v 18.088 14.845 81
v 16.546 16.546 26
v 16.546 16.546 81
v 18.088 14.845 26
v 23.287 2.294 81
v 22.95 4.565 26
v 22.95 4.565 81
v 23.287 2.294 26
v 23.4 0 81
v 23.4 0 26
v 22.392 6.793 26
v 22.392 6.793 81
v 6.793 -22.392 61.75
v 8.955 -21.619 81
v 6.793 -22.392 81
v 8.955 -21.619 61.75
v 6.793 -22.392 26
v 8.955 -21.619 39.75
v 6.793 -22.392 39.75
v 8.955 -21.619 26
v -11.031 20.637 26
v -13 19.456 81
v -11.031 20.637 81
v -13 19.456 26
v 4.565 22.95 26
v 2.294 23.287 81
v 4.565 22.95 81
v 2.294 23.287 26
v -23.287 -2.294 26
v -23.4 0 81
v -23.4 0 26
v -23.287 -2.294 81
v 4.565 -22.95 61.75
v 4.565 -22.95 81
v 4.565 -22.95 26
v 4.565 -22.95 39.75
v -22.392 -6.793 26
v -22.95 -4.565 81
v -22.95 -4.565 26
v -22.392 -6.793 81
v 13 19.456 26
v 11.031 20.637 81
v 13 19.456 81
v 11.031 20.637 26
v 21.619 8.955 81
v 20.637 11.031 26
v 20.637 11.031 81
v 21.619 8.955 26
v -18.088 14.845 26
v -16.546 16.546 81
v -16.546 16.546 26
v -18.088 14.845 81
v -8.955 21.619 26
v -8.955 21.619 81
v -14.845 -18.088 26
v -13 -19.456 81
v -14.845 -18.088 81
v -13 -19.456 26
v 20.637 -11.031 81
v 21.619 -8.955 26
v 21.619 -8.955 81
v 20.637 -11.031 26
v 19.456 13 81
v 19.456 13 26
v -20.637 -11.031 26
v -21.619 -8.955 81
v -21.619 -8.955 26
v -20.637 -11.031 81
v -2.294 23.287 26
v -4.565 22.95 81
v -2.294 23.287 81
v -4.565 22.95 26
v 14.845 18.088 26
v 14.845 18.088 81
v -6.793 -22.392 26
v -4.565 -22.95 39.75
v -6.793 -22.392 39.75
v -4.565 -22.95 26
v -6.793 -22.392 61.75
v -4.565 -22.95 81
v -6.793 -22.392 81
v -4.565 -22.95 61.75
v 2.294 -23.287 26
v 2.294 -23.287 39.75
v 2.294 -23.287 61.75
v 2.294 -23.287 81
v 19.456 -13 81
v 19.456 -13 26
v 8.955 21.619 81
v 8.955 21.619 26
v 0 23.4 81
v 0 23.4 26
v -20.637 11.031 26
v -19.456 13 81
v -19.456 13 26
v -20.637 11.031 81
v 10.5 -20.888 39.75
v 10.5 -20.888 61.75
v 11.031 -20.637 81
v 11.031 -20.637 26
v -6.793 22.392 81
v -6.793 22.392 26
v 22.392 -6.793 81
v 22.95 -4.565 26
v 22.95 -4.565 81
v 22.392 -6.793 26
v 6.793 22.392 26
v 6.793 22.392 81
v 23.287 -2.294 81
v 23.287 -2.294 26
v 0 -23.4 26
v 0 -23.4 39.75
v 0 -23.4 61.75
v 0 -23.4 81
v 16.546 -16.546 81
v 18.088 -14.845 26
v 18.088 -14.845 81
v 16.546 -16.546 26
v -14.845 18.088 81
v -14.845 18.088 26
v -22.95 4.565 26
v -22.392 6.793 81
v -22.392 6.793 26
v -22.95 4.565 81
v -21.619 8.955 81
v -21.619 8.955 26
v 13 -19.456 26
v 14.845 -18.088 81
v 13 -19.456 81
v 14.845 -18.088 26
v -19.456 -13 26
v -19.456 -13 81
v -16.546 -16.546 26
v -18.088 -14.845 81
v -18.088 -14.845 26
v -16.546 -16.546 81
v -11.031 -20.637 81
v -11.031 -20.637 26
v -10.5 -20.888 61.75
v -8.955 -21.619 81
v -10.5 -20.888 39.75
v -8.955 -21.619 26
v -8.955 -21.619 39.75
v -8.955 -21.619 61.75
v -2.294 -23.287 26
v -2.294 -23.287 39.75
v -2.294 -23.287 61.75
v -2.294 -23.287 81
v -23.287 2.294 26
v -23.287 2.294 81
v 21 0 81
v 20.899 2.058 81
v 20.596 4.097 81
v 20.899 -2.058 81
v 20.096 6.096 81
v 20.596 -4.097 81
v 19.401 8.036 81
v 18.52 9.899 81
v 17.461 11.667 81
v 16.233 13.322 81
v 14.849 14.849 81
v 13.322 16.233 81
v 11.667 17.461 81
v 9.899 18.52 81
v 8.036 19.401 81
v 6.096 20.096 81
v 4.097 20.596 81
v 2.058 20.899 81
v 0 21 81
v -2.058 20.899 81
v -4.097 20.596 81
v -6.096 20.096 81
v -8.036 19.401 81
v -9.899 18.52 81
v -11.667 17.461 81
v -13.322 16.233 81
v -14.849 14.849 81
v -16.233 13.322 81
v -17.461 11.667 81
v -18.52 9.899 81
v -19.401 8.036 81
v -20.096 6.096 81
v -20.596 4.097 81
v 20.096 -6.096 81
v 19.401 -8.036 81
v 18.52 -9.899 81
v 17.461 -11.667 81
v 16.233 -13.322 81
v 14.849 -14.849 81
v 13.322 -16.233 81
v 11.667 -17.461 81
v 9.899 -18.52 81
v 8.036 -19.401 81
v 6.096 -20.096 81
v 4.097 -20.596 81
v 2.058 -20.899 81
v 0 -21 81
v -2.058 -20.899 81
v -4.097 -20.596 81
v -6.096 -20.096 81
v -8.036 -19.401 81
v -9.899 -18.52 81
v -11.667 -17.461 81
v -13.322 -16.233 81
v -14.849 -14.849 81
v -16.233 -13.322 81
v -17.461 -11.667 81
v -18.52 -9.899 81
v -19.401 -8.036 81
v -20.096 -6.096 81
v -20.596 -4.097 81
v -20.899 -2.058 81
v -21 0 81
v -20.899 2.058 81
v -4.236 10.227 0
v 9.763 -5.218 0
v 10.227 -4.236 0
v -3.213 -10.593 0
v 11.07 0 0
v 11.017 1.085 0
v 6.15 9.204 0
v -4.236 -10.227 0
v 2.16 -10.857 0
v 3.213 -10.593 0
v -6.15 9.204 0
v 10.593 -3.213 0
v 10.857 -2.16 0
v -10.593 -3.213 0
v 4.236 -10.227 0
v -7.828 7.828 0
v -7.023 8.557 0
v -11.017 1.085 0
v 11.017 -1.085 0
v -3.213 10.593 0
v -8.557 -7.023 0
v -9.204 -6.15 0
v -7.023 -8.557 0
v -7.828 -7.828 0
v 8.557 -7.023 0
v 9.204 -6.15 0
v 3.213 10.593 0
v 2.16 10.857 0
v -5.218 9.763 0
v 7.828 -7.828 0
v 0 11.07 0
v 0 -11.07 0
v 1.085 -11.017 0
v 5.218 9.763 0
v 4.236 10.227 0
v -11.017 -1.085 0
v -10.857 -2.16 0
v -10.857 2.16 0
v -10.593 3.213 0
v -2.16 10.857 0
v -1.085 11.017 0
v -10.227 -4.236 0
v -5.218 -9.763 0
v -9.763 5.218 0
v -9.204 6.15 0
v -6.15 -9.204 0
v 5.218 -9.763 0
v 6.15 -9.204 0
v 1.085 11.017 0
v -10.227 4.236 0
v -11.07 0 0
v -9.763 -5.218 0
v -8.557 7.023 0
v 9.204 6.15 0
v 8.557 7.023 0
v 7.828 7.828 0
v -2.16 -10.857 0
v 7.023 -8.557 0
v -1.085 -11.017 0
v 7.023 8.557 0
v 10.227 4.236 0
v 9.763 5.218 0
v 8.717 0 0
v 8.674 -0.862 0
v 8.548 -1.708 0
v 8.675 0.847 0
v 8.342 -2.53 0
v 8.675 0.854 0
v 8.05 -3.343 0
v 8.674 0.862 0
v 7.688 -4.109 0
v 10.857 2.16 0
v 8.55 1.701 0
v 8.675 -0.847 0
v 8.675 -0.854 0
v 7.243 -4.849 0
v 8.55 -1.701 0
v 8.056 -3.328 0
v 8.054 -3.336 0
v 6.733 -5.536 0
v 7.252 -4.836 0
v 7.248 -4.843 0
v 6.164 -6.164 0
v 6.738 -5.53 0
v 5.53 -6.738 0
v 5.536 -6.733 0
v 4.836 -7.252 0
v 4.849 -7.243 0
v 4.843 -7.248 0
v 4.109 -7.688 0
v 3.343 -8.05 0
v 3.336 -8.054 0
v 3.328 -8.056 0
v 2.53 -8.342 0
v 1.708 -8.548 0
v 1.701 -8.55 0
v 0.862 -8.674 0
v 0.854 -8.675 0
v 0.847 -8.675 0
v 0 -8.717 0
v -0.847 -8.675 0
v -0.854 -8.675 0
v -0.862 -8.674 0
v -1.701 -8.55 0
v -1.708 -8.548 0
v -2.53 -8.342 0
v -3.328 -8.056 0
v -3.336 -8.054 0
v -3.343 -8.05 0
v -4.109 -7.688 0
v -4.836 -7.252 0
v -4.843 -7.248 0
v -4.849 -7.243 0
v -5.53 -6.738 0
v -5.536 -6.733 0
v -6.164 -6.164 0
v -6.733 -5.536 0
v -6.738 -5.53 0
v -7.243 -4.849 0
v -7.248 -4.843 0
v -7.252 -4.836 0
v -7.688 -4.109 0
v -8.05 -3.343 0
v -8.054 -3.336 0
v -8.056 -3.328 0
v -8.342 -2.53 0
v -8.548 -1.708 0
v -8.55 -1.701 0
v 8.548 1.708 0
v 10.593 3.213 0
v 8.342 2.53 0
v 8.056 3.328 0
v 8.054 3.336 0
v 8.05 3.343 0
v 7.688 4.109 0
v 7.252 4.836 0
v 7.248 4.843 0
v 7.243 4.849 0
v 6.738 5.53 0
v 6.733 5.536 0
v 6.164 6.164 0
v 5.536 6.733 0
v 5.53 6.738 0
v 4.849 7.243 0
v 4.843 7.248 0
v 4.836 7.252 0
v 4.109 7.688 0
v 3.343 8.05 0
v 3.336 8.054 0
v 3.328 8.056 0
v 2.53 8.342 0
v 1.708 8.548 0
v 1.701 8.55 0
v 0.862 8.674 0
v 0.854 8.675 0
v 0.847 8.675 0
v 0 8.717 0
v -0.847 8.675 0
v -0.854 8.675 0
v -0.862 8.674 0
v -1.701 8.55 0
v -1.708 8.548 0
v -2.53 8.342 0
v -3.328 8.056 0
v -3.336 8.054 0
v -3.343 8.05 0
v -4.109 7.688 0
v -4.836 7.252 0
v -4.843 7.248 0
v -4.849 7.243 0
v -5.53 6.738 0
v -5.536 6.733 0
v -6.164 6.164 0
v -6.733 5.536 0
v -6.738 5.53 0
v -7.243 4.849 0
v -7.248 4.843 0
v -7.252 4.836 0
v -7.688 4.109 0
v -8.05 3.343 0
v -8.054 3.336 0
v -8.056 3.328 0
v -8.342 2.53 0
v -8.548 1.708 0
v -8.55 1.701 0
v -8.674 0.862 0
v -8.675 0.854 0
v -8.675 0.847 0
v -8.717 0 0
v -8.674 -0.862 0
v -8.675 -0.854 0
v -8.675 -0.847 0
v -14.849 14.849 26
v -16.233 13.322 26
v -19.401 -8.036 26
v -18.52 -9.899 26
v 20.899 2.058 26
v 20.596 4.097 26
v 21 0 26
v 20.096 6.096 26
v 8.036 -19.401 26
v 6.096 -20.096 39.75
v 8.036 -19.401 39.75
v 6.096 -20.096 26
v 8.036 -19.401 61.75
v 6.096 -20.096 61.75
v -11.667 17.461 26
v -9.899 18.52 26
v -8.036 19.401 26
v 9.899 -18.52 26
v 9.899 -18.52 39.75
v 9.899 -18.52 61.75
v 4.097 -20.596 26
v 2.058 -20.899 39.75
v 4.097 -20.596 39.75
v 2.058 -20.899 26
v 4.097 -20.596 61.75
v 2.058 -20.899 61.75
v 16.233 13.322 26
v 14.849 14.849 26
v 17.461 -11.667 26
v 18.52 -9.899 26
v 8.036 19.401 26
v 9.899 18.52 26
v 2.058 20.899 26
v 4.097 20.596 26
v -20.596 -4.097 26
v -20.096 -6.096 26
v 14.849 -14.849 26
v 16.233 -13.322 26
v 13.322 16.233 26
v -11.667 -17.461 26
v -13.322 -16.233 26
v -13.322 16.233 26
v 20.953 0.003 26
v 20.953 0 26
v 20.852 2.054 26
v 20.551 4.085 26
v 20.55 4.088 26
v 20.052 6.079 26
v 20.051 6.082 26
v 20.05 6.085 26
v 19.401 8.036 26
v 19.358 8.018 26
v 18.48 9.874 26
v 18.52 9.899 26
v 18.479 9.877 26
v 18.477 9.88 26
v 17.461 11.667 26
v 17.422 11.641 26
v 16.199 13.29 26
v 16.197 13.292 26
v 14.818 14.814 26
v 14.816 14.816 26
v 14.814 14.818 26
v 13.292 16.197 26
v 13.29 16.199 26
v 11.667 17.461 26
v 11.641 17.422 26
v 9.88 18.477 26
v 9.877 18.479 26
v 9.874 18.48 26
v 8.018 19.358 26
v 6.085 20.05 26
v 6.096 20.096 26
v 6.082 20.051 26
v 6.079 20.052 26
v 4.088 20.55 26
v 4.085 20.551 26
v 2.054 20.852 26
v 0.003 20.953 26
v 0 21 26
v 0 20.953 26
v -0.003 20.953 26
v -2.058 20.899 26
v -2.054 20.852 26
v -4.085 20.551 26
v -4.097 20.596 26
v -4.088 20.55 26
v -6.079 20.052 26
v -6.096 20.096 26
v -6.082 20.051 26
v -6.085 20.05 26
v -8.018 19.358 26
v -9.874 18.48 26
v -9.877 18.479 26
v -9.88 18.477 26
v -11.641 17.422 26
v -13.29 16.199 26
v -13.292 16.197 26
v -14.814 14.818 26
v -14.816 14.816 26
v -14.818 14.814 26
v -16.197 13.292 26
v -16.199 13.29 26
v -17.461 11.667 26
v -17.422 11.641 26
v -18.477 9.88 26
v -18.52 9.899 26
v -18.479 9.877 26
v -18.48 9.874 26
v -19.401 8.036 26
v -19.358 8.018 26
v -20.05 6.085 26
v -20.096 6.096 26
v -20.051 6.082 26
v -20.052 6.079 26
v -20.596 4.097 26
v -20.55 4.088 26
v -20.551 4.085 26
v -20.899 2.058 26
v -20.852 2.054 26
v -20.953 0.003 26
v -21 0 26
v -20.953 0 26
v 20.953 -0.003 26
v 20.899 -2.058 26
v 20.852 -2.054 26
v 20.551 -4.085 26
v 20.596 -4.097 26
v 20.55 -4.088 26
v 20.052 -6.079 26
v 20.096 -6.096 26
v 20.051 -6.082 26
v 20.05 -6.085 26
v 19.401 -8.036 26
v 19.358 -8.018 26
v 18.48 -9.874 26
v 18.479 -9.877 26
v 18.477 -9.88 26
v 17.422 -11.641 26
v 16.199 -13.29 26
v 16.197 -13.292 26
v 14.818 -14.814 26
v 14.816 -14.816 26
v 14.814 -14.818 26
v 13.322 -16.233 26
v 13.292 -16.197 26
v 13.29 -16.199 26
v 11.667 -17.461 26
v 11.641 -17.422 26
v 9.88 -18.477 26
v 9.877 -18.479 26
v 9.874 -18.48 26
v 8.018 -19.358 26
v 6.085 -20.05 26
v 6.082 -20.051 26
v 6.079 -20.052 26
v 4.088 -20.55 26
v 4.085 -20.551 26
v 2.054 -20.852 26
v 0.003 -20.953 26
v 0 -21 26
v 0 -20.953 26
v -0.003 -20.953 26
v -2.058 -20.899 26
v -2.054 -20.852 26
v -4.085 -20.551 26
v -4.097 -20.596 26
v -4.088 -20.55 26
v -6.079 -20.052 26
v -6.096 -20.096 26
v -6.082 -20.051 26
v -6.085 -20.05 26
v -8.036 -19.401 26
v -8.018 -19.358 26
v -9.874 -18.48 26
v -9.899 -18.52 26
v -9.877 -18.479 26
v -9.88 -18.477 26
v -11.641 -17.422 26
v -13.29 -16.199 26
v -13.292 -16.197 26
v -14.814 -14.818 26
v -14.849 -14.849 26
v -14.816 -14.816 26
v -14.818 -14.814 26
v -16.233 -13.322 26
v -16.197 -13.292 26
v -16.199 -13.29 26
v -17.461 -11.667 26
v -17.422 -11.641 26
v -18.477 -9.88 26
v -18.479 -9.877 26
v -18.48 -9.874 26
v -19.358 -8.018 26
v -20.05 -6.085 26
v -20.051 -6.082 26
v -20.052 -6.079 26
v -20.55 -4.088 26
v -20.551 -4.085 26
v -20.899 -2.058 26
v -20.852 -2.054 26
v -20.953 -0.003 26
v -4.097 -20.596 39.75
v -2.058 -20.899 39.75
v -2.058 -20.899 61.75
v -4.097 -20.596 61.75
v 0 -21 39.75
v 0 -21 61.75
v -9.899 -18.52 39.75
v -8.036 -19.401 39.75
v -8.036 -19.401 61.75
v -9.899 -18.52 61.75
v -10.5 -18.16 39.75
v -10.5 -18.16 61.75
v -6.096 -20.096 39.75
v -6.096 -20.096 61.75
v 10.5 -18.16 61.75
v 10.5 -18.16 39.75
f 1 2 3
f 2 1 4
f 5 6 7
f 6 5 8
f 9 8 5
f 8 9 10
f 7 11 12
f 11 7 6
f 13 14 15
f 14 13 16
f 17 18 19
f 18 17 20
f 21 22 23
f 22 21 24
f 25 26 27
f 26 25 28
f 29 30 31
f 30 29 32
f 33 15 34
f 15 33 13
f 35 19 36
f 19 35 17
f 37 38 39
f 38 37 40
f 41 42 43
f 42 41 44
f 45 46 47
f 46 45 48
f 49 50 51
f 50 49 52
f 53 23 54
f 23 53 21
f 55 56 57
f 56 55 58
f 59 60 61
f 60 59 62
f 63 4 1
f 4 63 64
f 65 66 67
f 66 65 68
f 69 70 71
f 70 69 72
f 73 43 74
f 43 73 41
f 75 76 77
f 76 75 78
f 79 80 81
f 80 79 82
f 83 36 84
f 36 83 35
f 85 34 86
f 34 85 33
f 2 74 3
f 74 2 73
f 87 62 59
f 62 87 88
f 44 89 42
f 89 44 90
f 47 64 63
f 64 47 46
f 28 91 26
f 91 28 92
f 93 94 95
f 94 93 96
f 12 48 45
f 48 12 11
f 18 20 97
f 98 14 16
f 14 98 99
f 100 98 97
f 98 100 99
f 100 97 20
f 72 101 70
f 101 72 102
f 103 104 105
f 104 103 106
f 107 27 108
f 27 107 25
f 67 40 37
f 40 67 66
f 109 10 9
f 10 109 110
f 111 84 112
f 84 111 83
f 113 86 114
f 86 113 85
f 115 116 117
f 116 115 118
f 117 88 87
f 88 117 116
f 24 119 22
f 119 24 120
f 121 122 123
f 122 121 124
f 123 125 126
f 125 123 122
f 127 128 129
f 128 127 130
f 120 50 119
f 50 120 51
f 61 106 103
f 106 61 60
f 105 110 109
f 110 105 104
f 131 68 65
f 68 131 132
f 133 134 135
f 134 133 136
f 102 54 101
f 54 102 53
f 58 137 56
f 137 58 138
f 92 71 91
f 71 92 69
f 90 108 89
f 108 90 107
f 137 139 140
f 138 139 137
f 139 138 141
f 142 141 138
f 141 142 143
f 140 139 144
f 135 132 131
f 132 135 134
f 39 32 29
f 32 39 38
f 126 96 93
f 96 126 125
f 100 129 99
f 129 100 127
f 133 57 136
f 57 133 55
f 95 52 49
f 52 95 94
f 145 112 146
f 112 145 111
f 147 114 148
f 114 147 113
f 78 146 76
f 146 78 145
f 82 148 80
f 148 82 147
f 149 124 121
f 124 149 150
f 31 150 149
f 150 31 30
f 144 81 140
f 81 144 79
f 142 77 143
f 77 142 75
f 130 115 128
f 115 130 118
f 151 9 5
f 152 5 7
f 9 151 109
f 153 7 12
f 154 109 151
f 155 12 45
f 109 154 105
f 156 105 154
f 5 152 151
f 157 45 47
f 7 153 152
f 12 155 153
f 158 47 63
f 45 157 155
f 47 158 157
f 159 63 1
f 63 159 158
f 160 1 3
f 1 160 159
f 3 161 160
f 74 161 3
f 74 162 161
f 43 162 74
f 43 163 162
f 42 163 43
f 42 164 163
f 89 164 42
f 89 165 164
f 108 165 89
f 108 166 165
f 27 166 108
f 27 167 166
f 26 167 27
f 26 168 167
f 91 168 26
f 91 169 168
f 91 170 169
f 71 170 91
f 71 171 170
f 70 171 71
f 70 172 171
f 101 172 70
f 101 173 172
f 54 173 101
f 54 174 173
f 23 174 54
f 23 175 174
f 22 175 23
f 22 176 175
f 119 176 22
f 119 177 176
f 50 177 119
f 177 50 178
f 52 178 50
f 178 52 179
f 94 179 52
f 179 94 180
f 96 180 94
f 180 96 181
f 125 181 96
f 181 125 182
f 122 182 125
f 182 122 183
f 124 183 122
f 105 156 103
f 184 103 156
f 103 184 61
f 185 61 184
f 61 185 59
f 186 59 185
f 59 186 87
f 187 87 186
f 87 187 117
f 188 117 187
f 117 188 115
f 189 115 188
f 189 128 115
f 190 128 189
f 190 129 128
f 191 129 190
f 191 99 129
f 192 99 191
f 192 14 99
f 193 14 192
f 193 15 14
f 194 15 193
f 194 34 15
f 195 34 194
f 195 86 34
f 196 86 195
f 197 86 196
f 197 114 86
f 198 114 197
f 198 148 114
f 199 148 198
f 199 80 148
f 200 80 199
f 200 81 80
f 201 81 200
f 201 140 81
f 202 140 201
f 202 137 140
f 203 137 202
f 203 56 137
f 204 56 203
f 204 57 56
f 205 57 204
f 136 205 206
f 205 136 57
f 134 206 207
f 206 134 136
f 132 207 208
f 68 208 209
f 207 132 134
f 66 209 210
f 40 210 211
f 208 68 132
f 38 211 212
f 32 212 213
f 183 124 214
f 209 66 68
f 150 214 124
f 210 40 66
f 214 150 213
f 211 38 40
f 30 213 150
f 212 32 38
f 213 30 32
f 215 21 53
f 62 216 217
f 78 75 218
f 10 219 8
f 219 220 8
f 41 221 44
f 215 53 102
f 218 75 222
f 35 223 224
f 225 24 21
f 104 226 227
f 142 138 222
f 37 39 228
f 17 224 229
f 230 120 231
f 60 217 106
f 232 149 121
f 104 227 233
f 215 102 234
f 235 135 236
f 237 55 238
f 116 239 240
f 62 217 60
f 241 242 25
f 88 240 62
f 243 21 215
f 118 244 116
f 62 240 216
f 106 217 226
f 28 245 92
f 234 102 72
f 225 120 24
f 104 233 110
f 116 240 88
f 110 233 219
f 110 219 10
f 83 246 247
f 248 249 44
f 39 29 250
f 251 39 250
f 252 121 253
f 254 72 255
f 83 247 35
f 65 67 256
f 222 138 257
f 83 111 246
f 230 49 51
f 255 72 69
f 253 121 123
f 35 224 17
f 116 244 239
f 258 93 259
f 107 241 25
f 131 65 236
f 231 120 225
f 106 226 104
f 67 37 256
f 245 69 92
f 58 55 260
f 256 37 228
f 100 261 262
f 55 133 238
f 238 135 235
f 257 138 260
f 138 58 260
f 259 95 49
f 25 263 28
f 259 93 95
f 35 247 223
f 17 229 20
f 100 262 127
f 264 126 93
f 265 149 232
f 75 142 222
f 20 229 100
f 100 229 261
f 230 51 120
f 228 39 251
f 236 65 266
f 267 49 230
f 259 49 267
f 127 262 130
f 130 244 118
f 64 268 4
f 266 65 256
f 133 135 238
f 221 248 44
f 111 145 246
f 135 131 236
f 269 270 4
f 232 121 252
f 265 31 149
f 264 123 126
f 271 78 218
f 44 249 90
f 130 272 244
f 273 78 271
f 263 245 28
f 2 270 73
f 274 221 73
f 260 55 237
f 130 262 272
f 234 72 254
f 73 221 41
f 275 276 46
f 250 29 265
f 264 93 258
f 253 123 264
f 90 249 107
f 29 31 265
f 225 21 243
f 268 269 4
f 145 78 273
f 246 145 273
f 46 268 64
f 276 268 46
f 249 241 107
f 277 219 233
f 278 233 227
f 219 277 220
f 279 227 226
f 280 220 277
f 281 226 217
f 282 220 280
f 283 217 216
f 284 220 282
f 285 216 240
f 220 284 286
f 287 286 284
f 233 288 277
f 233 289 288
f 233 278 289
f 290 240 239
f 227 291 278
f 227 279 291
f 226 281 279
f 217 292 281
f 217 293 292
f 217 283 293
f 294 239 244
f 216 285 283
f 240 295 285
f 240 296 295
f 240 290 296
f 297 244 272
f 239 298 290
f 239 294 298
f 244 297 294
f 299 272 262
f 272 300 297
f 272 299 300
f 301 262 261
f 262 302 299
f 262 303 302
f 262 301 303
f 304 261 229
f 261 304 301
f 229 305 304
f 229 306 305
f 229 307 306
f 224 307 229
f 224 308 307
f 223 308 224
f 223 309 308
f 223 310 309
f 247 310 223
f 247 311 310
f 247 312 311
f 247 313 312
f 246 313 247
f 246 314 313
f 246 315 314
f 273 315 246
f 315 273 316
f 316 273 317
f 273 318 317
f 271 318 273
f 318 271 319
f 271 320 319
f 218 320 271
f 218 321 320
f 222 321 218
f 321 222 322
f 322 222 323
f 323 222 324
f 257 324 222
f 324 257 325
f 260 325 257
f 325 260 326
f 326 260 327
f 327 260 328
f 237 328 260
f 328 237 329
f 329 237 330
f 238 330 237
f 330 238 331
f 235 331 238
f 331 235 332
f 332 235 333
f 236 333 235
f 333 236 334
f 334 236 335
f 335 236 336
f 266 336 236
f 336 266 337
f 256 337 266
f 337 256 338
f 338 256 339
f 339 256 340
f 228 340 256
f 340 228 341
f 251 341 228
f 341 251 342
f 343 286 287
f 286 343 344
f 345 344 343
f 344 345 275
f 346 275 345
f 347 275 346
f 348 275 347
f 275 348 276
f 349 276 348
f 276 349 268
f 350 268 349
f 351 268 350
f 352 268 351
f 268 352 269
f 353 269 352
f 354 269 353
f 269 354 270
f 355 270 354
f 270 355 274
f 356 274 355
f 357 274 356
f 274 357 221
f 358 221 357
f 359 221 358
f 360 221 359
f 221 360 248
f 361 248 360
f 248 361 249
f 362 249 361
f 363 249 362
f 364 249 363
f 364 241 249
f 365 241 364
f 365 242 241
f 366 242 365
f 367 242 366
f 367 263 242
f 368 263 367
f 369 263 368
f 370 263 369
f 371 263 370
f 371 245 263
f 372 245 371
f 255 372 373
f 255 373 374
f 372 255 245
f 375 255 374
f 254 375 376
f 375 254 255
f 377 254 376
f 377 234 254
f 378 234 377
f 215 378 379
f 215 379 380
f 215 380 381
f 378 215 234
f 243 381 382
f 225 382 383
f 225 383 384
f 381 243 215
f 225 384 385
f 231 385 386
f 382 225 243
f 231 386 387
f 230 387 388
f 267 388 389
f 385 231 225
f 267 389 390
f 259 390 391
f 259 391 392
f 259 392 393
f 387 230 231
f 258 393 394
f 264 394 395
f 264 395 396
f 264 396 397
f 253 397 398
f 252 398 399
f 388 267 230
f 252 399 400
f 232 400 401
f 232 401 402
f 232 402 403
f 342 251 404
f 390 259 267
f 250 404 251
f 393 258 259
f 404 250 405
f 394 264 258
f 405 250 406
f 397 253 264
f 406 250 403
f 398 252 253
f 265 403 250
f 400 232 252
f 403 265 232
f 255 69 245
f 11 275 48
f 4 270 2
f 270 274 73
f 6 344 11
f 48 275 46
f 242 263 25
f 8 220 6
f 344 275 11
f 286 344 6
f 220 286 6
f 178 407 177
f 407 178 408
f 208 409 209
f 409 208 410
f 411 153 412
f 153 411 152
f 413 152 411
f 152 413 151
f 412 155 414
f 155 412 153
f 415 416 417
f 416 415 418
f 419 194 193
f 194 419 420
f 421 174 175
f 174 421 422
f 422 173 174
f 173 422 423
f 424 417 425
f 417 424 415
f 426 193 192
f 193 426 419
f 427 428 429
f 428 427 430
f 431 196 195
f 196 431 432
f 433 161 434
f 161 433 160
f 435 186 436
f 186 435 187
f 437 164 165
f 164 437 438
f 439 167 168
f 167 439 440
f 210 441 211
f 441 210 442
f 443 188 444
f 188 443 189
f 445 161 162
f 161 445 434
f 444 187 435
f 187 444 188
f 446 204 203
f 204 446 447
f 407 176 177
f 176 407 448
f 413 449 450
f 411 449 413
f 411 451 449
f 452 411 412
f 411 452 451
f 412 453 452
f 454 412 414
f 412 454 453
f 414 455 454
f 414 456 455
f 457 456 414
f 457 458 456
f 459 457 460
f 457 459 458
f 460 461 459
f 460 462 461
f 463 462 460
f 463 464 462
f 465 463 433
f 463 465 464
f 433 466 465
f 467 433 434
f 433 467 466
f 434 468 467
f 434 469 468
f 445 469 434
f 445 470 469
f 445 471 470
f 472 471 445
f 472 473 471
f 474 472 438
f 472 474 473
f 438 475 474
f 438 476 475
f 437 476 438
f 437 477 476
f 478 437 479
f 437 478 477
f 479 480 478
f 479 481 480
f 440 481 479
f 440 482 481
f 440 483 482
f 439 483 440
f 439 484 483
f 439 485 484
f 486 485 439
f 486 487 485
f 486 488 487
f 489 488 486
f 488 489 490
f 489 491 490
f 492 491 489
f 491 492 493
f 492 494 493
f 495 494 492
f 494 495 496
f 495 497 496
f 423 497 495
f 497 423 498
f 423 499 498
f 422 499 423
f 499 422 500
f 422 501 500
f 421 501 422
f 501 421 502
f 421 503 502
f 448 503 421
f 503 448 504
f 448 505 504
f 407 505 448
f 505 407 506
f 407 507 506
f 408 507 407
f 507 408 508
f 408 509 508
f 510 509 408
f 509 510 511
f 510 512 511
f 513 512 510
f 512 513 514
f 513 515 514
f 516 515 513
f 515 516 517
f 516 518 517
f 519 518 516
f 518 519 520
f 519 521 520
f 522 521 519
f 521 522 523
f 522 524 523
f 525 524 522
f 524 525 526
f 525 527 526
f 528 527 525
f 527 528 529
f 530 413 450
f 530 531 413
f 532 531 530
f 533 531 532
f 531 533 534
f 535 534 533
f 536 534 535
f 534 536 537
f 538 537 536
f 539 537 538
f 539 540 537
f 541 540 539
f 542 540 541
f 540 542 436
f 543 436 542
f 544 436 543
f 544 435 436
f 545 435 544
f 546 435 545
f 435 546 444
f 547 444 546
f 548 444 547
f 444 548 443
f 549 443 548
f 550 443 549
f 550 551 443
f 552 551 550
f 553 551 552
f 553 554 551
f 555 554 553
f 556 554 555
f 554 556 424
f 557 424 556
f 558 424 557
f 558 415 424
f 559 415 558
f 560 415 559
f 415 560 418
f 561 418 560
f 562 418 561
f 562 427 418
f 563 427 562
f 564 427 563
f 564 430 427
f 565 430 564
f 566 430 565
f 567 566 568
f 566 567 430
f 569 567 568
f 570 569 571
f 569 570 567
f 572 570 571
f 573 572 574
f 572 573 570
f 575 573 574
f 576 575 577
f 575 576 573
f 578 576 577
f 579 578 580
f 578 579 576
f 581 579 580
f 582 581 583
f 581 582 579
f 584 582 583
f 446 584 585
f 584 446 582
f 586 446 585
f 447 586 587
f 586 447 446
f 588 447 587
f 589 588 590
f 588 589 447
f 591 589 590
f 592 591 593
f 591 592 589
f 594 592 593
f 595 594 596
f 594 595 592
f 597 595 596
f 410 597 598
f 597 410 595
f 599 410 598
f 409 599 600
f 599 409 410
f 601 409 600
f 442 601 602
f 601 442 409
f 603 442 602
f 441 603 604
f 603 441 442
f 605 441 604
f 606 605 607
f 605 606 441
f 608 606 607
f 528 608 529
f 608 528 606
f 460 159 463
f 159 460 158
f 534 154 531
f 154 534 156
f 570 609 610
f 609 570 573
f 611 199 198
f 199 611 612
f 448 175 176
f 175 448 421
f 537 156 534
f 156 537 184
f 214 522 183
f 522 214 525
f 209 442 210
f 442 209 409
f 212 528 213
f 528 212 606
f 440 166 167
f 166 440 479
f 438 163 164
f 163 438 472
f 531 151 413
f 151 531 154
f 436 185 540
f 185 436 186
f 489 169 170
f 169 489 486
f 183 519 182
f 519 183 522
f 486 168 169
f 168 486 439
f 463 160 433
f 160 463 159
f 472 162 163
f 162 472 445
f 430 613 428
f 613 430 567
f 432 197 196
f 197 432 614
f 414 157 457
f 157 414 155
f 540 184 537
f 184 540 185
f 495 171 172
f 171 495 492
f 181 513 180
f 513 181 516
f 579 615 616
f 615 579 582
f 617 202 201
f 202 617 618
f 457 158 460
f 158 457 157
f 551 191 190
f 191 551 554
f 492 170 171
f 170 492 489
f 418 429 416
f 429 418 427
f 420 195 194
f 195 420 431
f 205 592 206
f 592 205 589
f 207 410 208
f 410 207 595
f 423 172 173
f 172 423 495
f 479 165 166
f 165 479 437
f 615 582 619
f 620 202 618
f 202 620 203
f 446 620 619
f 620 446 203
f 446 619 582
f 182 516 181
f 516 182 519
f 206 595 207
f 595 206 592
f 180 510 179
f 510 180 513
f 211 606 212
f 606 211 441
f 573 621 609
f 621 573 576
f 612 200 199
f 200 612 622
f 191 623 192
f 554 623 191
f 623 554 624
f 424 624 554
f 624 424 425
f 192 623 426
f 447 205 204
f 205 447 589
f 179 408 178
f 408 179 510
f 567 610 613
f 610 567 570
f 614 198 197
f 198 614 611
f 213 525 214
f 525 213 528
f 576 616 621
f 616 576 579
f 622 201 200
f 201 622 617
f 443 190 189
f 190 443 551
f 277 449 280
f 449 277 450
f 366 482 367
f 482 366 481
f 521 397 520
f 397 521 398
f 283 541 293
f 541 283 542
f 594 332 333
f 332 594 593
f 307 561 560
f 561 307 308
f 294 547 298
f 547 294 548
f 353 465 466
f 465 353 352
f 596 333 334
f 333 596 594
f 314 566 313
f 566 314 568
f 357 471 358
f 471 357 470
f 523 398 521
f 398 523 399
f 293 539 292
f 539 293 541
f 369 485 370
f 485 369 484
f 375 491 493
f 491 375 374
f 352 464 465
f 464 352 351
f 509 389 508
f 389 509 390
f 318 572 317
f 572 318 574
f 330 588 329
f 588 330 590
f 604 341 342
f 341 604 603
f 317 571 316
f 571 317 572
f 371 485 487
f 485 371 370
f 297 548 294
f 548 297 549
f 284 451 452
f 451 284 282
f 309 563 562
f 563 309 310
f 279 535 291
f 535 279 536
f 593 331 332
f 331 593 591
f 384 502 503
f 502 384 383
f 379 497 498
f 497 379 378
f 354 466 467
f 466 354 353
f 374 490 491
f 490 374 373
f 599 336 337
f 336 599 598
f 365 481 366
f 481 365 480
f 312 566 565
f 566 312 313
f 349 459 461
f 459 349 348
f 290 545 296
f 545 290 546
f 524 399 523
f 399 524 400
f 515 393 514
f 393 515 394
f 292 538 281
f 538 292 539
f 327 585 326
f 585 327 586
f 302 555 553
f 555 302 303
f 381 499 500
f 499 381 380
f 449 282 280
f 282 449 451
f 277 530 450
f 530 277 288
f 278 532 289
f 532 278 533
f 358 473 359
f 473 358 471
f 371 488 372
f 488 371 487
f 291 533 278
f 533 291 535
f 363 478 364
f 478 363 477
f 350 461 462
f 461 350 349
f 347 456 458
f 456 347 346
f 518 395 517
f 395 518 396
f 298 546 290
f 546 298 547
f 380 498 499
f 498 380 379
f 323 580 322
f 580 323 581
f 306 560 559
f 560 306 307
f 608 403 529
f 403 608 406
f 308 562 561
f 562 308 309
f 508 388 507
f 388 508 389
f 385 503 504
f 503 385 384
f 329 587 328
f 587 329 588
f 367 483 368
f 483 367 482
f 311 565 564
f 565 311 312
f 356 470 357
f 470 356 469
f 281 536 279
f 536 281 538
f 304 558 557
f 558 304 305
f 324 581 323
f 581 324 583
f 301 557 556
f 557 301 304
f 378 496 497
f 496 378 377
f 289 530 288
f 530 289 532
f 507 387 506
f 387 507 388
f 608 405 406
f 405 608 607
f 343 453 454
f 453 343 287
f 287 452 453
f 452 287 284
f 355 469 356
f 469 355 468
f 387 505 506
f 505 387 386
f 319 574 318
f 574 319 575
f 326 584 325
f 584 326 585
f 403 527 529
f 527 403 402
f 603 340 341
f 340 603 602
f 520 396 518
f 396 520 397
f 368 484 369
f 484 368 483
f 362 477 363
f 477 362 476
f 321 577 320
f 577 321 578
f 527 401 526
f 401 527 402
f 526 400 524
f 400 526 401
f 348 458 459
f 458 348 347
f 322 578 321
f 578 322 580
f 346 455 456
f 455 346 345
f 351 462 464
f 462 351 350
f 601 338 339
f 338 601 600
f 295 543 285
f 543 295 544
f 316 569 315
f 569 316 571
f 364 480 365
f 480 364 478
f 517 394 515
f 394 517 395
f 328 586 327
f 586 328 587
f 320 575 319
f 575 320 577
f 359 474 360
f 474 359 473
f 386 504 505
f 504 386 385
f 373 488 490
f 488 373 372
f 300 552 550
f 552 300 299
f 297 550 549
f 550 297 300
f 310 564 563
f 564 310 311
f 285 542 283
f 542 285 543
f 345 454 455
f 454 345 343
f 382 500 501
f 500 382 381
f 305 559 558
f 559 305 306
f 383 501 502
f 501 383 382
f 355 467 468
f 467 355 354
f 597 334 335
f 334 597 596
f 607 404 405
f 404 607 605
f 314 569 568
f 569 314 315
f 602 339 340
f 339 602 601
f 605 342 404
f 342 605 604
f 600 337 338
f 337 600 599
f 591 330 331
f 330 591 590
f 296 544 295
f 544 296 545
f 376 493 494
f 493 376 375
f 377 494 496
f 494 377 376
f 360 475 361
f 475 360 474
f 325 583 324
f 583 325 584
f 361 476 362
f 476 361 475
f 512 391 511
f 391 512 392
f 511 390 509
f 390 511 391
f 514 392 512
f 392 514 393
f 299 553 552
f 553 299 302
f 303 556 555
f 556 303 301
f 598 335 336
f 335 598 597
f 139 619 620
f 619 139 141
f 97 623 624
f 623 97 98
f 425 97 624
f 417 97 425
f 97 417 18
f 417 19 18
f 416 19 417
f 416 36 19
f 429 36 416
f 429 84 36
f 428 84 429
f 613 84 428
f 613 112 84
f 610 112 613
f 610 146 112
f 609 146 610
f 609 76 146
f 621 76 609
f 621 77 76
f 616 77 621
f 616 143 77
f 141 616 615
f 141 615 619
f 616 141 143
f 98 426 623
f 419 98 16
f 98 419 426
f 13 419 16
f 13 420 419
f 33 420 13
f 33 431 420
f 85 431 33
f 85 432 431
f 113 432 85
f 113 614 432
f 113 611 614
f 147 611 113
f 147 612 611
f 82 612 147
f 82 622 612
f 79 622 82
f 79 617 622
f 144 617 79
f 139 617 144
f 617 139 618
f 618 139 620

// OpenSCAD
// file: params.scad
// params.scad — shared parametric variables for the singulation module.
//
// EVERYTHING pill-specific lives here so a new pill regenerates every part
// (brief §4: "parametric pocket dimensions exposed as top-level variables").
// Measure your real pill with calipers, edit the four PILL numbers, re-render.
//
// Units: millimetres. Coordinate convention: disc lies in the XY plane, rotates
// about +Z; pills fall in -Z into the chute.

// ─────────────────────────────────────────────────────────────────────────────
// PILL (measure these)
// ─────────────────────────────────────────────────────────────────────────────
pill_shape     = "round";  // "round" (tablet) | "oblong" (capsule)
pill_diameter  = 9.0;      // round: tablet diameter
pill_thickness = 4.0;      // round: tablet height  (== oblong: capsule diameter)
pill_length    = 15.0;     // oblong: capsule length (ignored when round)
pill_width     = 7.0;      // oblong: capsule width  (ignored when round)

// ─────────────────────────────────────────────────────────────────────────────
// POCKET (derived from the pill + clearances — tune the clearances per pill)
// ─────────────────────────────────────────────────────────────────────────────
pocket_side_clear = 0.6;   // added around the pill so it drops in freely (not tight)
pocket_chamfer    = 0.8;   // chamfer at the pocket mouth so pills self-seat (anti-jam)

// Pocket depth ≈ ONE pill thickness so a second pill can't stack + ride along
// (brief §4). The disc thickness equals the pocket depth (pockets are through the
// disc; the housing floor holds the pill until it reaches the drop-hole).
pocket_depth      = pill_thickness + 0.6;   // small clearance over pill height

// Round pocket bore / oblong pocket footprint (computed, but overridable):
round_pocket_d    = pill_diameter + 2*pocket_side_clear;
oblong_pocket_l   = pill_length   + 2*pocket_side_clear;
oblong_pocket_w   = pill_width    + 2*pocket_side_clear;

// ─────────────────────────────────────────────────────────────────────────────
// DISC
// ─────────────────────────────────────────────────────────────────────────────
pocket_count   = 6;        // pockets evenly spaced around the disc
disc_edge_wall = 3.0;      // material between a pocket and the disc rim
disc_hub_d     = 14.0;     // solid central hub diameter (around the shaft)
disc_thickness = pocket_depth;               // see note above

// Radius of the circle the pocket CENTRES sit on. Derived so neighbouring pockets
// don't overlap and there's wall to the rim. Max pocket footprint radius:
pocket_reach   = (pill_shape == "oblong")
                    ? max(oblong_pocket_l, oblong_pocket_w)/2
                    : round_pocket_d/2;
pocket_ring_r  = max(disc_hub_d/2 + pocket_reach + 1,
                     // keep arc gap between pockets ≥ their footprint:
                     (pocket_reach + 1) / sin(180/pocket_count));
disc_d         = 2*(pocket_ring_r + pocket_reach + disc_edge_wall);

// ─────────────────────────────────────────────────────────────────────────────
// SHAFT / ACTUATOR COUPLING
// ─────────────────────────────────────────────────────────────────────────────
// "servo" = press onto an SG90 horn; "dshaft" = 5 mm D-shaft (stepper/motor).
shaft_type     = "servo";
dshaft_d       = 5.0;      // 28BYJ-48 / motor D-shaft nominal
dshaft_flat    = 3.0;      // flat-to-round chord for the D
servo_horn_d   = 8.0;      // recess dia for a round servo horn to sit in
servo_horn_h   = 2.0;      // horn thickness recess

// ─────────────────────────────────────────────────────────────────────────────
// HOUSING / CHUTE
// ─────────────────────────────────────────────────────────────────────────────
disc_clear     = 0.4;      // radial gap disc↔housing so it spins freely
floor_thick    = 2.0;      // housing floor under the disc
wiper_gap      = pill_thickness + 0.4;  // scraper lip height above disc face
drop_hole_d    = round_pocket_d + 2;    // clearance hole in floor at drop station
sensor_slot_w  = 6.0;      // slot for the IR emitter/receiver across the chute
wall           = 2.4;      // general printed wall thickness

// Rendering smoothness
$fn = 64;
// main file
// hopper.scad — refillable bulk hopper with a funnel floor + lid (brief §4/§8).
//
// Sits above the scoop window of disc_housing.scad. Funnels loose pills down toward
// the disc so a pocket passing under the opening scoops exactly one. Removable for
// refilling ("dump your pills in"); windowed wall so remaining pills are visible.
include <params.scad>

hopper_id      = 42;                 // internal width at the top (bulk volume)
hopper_h       = 55;                 // straight-wall height
funnel_h       = 26;                 // funnel taper height
mouth_d        = round_pocket_d*1.7; // funnel exit ≈ scoop window over the disc
hopper_wall    = wall;

module hopper_body() {
  difference() {
    union() {
      // straight bulk section
      translate([0,0,funnel_h])
        cylinder(h = hopper_h, d = hopper_id + 2*hopper_wall);
      // funnel section
      cylinder(h = funnel_h, d1 = mouth_d + 2*hopper_wall,
                              d2 = hopper_id + 2*hopper_wall);
    }
    // hollow interior
    union() {
      translate([0,0,funnel_h])
        cylinder(h = hopper_h + 0.1, d = hopper_id);
      translate([0,0,-0.1])
        cylinder(h = funnel_h + 0.2, d1 = mouth_d, d2 = hopper_id);
    }
    // viewing window (windowed wall — pair with firmware low-pill count)
    translate([0,0,funnel_h + hopper_h*0.45])
      rotate([90,0,0])
        translate([0,0, (hopper_id/2)])
          cube([hopper_id*0.5, hopper_h*0.4, hopper_wall*3], center = true);
  }
}

module hopper_lid() {
  // Simple friction lid; keeps pills clean/dry. Add a lock feature here if the
  // safety review calls for a locking lid (brief §10).
  lid_d = hopper_id + 2*hopper_wall;
  union() {
    cylinder(h = hopper_wall, d = lid_d + 2);
    translate([0,0,-3]) cylinder(h = 3.1, d = hopper_id - 0.6); // plug
  }
}

// Render the hopper. Uncomment the lid to see/print it separately.
hopper_body();
// translate([hopper_id + 20, 0, 0]) hopper_lid();

echo(str("hopper_id=", hopper_id, "  mouth_d=", mouth_d));
